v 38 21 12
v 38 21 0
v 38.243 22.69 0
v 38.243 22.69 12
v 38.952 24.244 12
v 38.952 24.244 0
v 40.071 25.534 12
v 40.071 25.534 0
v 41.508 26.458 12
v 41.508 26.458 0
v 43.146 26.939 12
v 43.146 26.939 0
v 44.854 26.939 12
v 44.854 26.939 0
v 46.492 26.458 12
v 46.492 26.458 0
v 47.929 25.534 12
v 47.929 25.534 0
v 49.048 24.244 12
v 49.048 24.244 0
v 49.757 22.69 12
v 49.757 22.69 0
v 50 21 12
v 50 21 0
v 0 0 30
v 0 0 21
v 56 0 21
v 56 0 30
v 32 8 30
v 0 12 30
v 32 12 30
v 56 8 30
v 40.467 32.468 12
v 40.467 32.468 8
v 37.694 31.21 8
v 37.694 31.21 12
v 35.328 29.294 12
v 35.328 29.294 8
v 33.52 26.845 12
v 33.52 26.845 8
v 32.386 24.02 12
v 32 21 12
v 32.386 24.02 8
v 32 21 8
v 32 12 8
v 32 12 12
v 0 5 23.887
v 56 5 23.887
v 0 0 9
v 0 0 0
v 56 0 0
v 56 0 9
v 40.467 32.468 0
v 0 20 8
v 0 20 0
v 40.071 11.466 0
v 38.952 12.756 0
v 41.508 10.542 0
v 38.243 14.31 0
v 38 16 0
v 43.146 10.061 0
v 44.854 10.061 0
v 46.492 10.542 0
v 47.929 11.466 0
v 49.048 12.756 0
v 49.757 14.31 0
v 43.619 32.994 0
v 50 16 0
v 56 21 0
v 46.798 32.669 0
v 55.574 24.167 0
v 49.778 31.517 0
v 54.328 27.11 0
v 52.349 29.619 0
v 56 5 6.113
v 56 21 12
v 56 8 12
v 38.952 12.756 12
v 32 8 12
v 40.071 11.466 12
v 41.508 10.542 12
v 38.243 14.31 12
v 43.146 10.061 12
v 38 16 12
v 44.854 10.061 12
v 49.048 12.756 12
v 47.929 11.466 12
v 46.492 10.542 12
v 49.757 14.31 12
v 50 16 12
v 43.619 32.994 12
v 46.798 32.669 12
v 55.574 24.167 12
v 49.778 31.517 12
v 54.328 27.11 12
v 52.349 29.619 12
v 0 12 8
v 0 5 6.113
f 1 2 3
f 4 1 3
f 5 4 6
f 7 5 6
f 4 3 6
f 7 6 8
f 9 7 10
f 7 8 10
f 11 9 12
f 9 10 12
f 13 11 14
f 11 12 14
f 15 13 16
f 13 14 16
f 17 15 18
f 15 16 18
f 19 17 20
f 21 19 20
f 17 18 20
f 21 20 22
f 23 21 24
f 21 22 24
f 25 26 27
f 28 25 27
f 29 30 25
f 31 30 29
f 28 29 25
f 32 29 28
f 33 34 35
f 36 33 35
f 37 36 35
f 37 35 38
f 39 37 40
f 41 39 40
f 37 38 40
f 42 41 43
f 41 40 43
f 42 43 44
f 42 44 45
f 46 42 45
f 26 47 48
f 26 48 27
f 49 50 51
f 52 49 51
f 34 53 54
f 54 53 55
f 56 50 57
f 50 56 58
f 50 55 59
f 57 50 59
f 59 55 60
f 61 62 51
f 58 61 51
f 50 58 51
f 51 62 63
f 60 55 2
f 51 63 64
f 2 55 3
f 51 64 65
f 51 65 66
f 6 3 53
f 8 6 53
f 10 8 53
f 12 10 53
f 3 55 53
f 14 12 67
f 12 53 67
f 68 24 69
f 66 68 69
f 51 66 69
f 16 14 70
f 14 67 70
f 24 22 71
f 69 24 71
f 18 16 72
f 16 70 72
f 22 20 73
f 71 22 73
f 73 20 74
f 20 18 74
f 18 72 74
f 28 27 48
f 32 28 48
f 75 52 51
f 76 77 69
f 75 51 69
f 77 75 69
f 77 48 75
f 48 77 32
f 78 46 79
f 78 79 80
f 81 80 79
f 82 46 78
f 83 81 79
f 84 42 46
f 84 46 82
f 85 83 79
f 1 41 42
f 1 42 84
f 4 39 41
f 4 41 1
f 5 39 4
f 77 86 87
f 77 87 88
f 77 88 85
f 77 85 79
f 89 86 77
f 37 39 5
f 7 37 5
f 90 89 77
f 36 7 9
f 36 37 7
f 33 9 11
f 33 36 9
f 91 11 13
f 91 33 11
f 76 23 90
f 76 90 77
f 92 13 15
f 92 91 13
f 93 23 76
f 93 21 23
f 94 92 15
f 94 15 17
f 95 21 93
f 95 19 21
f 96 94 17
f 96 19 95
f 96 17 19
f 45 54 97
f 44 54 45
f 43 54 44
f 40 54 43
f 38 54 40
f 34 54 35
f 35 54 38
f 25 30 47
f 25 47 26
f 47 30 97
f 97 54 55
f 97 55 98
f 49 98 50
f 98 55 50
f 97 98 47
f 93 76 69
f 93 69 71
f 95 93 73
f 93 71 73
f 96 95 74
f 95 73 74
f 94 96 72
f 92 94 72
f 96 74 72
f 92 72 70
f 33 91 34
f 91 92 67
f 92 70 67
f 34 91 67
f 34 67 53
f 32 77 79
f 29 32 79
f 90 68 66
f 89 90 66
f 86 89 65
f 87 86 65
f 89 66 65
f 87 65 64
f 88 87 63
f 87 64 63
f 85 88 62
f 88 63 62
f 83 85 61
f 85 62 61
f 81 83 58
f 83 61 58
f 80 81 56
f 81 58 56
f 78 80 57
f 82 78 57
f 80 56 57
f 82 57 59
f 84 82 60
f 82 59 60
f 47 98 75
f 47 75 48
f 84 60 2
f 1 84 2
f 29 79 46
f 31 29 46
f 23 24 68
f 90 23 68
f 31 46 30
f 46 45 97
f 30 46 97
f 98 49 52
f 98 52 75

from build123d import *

# Parameters (mm, degrees)
EXTRUDE_1_DEPTH     = 30
EXTRUDE_2_DEPTH     = 8
EXTRUDE_3_DEPTH     = 12
CUT_EXTRUDE_1_DEPTH = 72.589105316


with BuildPart() as part:
    # 草图1 → 凸台-拉伸1 (new body)
    with BuildSketch(Plane.XY):
        Polygon((0, 12), (0, 0), (56, 0), (56, 8), (32, 8), (32, 12), align=None)
    extrude(amount=EXTRUDE_1_DEPTH)

    # 草图1<4> → 凸台-拉伸2 (add)
    with BuildSketch(Plane.XY):
        with BuildLine():
            Line((0, 20), (0, 12))
            Line((0, 12), (32, 12))
            Line((32, 12), (32, 21))
            ThreePointArc((32, 21), (34.345975777, 28.127398986), (40.466636051, 32.468013743))
            Line((40.466636051, 32.468013743), (0, 20))
        make_face()
    extrude(amount=EXTRUDE_2_DEPTH)

    # 草图1<5> → 凸台-拉伸3 (add)
    with BuildSketch(Plane.XY):
        with BuildLine():
            Line((32, 8), (56, 8))
            Line((56, 8), (56, 21))
            ThreePointArc((56, 21), (51.127398986, 30.654024223), (40.466636051, 32.468013743))
            ThreePointArc((40.466636051, 32.468013743), (34.345975777, 28.127398986), (32, 21))
            Line((32, 21), (32, 12))
            Line((32, 12), (32, 8))
        make_face()
        with BuildLine():
            ThreePointArc((38, 21), (44, 27), (50, 21))
            Line((50, 21), (50, 16))
            ThreePointArc((50, 16), (44, 10), (38, 16))
            Line((38, 16), (38, 21))
        make_face(mode=Mode.SUBTRACT)
    extrude(amount=EXTRUDE_3_DEPTH)

    # 草图5 → 切除-拉伸1 (cut, through all)
    with BuildSketch(Plane.ZY):
        Polygon((9, 0), (6.113248654, 5), (23.886751346, 5), (21, 0), align=None)
    extrude(amount=-CUT_EXTRUDE_1_DEPTH, mode=Mode.SUBTRACT)


solid = part.part
